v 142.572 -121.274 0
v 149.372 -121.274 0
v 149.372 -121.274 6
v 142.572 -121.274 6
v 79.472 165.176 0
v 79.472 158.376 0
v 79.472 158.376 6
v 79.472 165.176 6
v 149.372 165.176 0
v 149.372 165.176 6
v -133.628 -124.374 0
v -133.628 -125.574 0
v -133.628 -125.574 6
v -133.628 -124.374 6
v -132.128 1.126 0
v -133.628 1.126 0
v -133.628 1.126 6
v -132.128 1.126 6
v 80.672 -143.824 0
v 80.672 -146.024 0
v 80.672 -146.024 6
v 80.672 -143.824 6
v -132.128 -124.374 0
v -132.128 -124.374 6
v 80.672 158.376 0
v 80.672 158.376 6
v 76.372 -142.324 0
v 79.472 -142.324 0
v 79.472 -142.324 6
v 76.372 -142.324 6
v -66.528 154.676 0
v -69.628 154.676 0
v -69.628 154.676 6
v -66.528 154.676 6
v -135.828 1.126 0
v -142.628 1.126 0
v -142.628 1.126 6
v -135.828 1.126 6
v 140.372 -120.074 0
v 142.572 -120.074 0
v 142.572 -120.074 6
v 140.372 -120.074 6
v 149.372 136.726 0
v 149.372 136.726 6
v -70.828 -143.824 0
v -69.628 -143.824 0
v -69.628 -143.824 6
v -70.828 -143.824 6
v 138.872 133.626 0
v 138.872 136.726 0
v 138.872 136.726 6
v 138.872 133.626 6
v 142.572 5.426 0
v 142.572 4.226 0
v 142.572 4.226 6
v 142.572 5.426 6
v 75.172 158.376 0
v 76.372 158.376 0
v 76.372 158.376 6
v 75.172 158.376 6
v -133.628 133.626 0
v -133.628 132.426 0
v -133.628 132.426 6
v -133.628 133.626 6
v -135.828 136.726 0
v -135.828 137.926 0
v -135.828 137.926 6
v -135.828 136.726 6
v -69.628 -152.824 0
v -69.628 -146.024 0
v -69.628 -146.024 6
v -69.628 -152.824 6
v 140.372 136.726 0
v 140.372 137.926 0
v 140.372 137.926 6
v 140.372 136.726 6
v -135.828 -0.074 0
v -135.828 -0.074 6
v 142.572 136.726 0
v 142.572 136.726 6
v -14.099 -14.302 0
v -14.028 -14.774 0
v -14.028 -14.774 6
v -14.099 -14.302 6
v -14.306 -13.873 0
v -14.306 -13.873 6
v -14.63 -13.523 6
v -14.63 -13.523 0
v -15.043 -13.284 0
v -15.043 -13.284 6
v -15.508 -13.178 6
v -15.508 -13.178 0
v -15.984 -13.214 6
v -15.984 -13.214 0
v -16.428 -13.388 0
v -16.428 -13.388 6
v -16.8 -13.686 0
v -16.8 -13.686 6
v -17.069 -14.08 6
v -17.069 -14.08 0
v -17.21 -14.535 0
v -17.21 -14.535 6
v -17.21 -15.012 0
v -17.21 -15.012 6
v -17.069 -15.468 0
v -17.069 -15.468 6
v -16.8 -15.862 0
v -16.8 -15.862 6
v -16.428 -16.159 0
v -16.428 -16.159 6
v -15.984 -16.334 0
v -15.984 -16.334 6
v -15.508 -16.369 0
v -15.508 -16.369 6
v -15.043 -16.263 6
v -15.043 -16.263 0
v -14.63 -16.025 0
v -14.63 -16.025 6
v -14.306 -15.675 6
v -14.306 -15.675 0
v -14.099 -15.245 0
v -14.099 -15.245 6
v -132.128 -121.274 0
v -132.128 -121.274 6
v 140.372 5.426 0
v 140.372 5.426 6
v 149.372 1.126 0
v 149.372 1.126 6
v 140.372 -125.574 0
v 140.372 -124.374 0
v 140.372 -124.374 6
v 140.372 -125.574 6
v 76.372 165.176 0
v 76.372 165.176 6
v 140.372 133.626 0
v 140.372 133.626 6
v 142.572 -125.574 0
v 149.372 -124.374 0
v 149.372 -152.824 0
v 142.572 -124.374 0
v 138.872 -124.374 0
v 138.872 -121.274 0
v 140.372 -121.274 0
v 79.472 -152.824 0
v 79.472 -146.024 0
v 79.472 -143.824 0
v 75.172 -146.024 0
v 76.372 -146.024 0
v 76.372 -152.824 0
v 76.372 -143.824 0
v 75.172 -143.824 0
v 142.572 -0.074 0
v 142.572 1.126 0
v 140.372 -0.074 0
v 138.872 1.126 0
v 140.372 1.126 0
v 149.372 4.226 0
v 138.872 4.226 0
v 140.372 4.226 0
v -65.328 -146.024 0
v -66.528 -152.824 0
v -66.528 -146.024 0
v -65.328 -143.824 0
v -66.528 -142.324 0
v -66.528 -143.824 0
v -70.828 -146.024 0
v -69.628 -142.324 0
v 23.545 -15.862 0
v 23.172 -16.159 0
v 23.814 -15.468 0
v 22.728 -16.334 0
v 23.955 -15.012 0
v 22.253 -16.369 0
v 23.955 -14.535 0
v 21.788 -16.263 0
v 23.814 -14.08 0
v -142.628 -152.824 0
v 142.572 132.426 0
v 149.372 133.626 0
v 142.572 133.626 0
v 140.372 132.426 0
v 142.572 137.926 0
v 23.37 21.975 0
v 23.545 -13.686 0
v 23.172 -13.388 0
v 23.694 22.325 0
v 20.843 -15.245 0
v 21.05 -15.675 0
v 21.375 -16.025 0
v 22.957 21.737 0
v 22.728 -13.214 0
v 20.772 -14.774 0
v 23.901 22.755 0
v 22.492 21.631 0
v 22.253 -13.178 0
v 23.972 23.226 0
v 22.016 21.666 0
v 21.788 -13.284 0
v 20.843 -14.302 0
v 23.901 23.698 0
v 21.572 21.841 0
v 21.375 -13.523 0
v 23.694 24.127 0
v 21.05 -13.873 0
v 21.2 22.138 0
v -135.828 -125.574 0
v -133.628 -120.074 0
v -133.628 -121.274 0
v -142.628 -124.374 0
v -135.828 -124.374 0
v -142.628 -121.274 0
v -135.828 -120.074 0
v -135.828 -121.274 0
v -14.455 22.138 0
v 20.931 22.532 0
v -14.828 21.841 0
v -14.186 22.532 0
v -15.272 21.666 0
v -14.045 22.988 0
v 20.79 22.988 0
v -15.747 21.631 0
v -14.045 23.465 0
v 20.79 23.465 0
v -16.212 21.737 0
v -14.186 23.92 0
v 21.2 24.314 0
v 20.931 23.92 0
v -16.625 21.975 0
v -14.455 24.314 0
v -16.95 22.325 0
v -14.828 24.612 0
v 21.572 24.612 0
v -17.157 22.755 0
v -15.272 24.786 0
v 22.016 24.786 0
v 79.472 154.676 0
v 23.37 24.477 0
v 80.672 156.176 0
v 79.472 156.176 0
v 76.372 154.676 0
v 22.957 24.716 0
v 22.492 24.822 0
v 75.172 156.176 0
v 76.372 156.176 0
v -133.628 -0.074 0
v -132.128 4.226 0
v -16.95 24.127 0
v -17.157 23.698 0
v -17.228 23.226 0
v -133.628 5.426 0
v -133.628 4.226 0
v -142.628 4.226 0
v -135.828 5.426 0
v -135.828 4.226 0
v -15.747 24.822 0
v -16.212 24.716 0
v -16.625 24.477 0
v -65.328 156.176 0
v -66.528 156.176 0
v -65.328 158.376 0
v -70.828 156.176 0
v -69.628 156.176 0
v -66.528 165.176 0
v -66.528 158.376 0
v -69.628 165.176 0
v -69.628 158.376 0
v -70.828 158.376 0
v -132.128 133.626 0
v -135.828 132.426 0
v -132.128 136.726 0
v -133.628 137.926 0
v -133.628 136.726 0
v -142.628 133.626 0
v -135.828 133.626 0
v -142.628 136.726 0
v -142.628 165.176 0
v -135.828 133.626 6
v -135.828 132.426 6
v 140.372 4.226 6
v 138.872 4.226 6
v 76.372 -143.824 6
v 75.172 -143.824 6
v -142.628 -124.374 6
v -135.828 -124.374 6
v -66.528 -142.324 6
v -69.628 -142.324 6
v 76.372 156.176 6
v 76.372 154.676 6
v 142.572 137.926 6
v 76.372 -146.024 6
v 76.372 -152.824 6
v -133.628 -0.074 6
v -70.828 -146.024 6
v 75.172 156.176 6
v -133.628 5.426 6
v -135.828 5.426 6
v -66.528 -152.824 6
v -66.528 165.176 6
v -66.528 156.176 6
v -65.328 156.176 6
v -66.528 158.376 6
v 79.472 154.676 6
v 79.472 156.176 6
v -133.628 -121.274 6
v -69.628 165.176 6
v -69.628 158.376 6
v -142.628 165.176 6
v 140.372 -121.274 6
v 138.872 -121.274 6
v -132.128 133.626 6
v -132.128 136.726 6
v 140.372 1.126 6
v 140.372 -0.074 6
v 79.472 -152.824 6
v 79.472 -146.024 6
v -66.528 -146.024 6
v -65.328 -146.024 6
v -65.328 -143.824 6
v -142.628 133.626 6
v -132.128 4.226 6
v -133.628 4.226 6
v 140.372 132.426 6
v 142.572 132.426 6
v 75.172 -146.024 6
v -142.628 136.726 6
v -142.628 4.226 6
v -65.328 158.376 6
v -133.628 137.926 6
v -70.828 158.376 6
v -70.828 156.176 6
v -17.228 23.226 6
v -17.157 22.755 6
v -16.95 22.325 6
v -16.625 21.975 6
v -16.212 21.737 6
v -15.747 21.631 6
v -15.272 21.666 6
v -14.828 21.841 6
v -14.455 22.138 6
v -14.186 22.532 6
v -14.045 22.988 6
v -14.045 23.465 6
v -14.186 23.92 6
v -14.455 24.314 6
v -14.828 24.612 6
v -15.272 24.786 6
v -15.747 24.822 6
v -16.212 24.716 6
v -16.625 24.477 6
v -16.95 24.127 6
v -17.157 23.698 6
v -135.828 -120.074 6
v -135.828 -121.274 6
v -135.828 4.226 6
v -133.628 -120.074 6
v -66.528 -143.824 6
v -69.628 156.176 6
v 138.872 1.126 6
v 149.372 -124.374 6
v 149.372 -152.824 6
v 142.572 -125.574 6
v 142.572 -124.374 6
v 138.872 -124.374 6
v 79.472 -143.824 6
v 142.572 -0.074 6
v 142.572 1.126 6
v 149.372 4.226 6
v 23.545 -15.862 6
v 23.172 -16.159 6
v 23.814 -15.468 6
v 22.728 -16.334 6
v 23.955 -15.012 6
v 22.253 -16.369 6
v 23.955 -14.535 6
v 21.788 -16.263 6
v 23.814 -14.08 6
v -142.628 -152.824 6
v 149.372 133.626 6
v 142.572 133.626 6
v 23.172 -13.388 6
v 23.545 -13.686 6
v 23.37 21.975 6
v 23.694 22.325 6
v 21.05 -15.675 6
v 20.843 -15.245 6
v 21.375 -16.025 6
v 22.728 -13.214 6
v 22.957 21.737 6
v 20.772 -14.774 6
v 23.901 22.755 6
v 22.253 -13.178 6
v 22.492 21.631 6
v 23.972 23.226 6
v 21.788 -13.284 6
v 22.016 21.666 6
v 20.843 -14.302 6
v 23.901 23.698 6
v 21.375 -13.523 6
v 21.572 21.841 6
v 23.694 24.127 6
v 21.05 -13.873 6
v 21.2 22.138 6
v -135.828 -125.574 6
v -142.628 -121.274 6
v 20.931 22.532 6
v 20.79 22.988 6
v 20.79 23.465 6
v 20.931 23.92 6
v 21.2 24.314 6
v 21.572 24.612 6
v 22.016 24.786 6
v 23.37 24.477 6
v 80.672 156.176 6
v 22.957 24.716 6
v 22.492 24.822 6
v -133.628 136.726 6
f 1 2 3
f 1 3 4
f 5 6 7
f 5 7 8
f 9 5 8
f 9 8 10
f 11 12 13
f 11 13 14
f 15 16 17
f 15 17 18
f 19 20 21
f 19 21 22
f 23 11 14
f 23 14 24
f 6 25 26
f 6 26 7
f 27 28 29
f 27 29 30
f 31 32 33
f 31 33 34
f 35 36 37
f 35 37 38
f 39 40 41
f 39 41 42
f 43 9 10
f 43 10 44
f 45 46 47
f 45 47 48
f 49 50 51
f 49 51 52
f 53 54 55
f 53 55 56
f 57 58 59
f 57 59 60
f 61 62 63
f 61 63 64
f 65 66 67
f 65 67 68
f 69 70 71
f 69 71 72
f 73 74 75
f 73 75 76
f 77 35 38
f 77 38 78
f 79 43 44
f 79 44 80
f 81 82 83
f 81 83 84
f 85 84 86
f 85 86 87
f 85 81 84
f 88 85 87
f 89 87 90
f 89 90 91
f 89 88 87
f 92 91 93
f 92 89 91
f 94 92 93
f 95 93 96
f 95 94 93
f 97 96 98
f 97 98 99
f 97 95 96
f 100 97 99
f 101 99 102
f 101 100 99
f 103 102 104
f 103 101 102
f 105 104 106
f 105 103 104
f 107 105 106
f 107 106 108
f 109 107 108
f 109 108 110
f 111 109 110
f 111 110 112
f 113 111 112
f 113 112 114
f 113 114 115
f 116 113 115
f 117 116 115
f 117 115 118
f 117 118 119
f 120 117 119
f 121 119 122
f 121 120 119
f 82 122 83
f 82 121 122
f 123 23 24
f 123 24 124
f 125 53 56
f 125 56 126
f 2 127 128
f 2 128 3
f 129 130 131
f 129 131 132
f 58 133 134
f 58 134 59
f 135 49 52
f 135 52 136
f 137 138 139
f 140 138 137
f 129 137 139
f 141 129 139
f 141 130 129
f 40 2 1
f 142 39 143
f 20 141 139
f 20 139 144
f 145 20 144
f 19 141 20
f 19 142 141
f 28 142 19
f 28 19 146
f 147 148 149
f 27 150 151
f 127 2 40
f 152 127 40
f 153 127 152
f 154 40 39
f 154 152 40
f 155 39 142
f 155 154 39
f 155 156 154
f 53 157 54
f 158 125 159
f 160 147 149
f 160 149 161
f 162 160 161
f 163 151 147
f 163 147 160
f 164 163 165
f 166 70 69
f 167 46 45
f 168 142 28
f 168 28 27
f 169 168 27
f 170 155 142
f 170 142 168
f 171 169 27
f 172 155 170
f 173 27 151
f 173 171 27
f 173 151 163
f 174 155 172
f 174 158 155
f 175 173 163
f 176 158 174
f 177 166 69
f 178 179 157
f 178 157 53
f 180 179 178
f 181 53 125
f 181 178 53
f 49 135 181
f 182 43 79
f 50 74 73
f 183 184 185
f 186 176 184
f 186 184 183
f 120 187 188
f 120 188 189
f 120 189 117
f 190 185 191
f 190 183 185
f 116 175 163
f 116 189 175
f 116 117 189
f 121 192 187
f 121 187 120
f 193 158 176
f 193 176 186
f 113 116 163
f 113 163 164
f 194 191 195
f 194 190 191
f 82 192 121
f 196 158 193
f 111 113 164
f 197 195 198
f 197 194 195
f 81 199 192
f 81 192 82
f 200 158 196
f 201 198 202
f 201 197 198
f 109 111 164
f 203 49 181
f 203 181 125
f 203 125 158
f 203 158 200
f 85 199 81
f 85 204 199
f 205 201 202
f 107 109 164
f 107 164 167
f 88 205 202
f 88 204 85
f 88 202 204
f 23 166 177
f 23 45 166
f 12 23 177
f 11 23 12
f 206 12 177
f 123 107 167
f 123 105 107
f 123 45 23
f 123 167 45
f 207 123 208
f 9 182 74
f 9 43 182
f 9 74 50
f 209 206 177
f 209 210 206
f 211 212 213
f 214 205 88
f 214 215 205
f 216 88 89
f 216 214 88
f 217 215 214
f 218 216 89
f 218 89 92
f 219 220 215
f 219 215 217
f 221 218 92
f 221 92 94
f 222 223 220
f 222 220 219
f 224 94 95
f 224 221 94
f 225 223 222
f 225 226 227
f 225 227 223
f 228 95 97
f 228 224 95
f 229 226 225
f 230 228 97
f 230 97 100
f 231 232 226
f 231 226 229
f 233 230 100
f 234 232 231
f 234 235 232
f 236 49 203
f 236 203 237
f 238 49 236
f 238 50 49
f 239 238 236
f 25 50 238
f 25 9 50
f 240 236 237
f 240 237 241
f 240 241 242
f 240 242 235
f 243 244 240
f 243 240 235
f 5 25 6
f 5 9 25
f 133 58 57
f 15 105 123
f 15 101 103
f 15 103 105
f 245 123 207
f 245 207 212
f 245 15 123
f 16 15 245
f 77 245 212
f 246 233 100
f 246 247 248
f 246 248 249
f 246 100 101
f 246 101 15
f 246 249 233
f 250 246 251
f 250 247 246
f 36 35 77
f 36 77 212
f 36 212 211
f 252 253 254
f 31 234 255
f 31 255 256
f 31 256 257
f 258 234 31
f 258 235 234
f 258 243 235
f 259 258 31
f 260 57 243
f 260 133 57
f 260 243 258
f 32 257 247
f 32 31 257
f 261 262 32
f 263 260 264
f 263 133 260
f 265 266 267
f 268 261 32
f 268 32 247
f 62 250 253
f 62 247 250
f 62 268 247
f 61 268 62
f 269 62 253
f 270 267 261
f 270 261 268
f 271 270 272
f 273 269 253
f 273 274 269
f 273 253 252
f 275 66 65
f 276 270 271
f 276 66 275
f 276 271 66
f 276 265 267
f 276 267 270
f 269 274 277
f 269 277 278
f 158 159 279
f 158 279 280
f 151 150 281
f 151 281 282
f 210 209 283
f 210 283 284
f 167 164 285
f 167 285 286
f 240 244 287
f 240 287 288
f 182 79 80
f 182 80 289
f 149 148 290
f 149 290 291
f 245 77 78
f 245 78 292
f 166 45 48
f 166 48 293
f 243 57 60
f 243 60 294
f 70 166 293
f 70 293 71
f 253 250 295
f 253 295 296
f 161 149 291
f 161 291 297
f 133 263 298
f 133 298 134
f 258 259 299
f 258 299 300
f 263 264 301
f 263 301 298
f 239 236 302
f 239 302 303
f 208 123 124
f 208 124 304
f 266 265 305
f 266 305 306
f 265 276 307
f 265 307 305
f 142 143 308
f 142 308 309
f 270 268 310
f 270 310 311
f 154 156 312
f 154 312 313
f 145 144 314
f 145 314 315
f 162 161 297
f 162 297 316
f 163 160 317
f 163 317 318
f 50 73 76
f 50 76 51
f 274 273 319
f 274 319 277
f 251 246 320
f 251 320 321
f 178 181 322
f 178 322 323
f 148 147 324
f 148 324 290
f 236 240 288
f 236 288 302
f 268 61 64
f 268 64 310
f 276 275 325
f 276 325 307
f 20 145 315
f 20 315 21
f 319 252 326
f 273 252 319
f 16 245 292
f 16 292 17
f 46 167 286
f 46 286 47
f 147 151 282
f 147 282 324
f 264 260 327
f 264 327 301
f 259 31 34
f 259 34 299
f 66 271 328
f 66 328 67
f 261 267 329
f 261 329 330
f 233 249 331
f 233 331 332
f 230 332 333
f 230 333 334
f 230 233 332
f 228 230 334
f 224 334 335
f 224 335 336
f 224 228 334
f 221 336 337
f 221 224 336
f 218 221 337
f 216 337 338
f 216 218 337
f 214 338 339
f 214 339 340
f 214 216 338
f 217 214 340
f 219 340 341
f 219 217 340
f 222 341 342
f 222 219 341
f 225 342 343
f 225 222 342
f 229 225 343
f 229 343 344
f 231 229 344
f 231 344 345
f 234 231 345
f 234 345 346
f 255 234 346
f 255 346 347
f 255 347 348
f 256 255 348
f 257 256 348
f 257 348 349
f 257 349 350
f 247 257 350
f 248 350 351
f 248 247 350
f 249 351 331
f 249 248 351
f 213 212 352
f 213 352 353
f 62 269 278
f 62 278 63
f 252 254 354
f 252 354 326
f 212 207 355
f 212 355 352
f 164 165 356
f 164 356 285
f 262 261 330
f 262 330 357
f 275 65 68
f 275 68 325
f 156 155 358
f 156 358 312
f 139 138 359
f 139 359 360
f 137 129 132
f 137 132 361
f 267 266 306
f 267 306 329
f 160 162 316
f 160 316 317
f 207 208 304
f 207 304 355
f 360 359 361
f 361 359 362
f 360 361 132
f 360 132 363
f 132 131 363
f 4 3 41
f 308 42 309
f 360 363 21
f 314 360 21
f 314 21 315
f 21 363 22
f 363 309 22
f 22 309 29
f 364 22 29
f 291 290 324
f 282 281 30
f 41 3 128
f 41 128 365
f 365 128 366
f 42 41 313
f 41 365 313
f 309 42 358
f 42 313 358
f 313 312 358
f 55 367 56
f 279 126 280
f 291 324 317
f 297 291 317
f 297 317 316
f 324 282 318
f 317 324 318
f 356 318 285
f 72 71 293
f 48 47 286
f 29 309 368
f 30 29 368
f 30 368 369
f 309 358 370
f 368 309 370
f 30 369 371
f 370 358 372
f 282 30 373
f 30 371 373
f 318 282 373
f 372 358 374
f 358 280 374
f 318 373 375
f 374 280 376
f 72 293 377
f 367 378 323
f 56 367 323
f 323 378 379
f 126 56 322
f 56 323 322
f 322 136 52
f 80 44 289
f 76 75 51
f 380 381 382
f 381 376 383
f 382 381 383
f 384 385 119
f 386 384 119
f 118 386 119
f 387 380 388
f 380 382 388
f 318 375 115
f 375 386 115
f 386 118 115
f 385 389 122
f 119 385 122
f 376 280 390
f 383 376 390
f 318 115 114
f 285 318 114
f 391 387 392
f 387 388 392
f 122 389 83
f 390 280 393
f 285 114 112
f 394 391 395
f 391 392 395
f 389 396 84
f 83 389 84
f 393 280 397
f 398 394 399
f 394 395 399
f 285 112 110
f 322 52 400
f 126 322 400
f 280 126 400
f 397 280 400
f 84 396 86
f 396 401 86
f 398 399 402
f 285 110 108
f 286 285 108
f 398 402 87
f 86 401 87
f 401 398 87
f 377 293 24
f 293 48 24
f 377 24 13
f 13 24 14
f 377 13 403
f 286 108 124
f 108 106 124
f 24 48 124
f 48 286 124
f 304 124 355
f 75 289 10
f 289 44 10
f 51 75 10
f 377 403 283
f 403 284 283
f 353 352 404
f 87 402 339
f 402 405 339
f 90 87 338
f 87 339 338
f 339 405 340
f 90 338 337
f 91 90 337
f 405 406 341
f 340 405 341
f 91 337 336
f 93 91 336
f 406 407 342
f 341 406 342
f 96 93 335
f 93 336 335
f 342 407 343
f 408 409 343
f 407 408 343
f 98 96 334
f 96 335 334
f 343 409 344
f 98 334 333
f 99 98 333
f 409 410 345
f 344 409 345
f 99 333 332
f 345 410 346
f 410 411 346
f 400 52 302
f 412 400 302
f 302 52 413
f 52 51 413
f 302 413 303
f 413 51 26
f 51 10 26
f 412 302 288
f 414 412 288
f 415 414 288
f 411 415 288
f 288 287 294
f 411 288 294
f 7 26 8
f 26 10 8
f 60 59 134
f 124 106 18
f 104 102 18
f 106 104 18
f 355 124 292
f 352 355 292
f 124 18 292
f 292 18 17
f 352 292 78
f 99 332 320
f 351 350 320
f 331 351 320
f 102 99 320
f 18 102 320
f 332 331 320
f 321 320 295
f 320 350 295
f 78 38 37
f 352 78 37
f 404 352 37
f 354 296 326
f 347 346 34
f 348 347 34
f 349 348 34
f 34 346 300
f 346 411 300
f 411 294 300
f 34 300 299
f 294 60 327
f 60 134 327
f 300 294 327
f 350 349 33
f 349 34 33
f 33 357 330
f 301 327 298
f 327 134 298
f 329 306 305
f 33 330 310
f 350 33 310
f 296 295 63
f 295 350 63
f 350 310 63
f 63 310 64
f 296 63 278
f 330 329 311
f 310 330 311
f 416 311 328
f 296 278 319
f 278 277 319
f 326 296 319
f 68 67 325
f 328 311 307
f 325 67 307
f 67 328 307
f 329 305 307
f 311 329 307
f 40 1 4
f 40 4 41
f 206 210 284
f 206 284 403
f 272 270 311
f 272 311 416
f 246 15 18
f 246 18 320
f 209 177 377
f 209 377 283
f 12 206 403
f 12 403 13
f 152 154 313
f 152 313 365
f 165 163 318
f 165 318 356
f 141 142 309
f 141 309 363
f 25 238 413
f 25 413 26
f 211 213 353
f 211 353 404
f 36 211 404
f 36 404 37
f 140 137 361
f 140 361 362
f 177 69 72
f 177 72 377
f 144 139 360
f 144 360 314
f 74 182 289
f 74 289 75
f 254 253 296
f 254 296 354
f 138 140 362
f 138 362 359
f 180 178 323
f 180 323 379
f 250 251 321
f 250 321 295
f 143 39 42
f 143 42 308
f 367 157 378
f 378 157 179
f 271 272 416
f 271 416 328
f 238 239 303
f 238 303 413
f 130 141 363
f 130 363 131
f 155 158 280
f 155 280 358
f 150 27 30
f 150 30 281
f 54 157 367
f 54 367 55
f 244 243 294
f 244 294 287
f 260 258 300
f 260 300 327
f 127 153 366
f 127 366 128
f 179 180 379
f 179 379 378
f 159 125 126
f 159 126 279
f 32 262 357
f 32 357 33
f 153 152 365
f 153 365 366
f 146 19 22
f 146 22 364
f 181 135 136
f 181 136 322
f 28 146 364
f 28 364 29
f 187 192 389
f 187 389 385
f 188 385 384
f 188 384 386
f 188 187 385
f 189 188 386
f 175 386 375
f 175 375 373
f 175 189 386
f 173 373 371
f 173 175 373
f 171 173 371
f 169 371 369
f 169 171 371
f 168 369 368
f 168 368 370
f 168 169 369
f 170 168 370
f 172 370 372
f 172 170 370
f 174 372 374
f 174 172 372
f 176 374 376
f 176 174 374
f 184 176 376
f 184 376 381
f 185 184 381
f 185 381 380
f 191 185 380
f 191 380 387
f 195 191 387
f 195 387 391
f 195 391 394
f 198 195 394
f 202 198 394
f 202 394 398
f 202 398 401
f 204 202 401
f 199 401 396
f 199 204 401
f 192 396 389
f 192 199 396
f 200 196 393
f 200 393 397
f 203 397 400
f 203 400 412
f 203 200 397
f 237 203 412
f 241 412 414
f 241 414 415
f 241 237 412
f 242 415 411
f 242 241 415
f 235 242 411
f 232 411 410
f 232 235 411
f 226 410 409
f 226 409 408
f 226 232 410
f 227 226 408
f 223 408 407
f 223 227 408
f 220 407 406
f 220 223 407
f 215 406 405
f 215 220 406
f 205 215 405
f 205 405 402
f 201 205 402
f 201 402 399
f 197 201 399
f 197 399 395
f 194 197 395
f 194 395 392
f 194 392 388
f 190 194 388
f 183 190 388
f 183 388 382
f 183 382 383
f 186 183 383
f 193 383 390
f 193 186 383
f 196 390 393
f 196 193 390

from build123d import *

# Parameters (mm, degrees)
SKETCH_1_R      = 1.6
EXTRUDE_1_DEPTH = 6


with BuildPart() as part:
    # Эскиз1 → Бобышка-Вытянуть1 (new body)
    with BuildSketch(Plane.XY):
        Polygon((-142.627592608, 165.17616196), (-69.627592608, 165.17616196), (-69.627592608, 158.37616196), (-70.827592608, 158.37616196), (-70.827592608, 156.17616196), (-69.627592608, 156.17616196), (-69.627592608, 154.67616196), (-66.527592608, 154.67616196), (-66.527592608, 156.17616196), (-65.327592608, 156.17616196), (-65.327592608, 158.37616196), (-66.527592608, 158.37616196), (-66.527592608, 165.17616196), (76.372407392, 165.17616196), (76.372407392, 158.37616196), (75.172407392, 158.37616196), (75.172407392, 156.17616196), (76.372407392, 156.17616196), (76.372407392, 154.67616196), (79.472407392, 154.67616196), (79.472407392, 156.17616196), (80.672407392, 156.17616196), (80.672407392, 158.37616196), (79.472407392, 158.37616196), (79.472407392, 165.17616196), (149.372407392, 165.17616196), (149.372407392, 136.72616196), (142.572407392, 136.72616196), (142.572407392, 137.92616196), (140.372407392, 137.92616196), (140.372407392, 136.72616196), (138.872407392, 136.72616196), (138.872407392, 133.62616196), (140.372407392, 133.62616196), (140.372407392, 132.42616196), (142.572407392, 132.42616196), (142.572407392, 133.62616196), (149.372407392, 133.62616196), (149.372407392, 132.07616196), (149.372407392, 4.22616196), (142.572407392, 4.22616196), (142.572407392, 5.42616196), (140.372407392, 5.42616196), (140.372407392, 4.22616196), (138.872407392, 4.22616196), (138.872407392, 1.12616196), (140.372407392, 1.12616196), (140.372407392, -0.07383804), (142.572407392, -0.07383804), (142.572407392, 1.12616196), (149.372407392, 1.12616196), (149.372407392, -121.27383804), (142.572407392, -121.27383804), (142.572407392, -120.07383804), (140.372407392, -120.07383804), (140.372407392, -121.27383804), (138.872407392, -121.27383804), (138.872407392, -124.37383804), (140.372407392, -124.37383804), (140.372407392, -125.57383804), (142.572407392, -125.57383804), (142.572407392, -124.37383804), (149.372407392, -124.37383804), (149.372407392, -152.82383804), (79.472407392, -152.82383804), (79.472407392, -146.02383804), (80.672407392, -146.02383804), (80.672407392, -143.82383804), (79.472407392, -143.82383804), (79.472407392, -142.32383804), (76.372407392, -142.32383804), (76.372407392, -143.82383804), (75.172407392, -143.82383804), (75.172407392, -146.02383804), (76.372407392, -146.02383804), (76.372407392, -152.82383804), (-66.527592608, -152.82383804), (-66.527592608, -146.02383804), (-65.327592608, -146.02383804), (-65.327592608, -143.82383804), (-66.527592608, -143.82383804), (-66.527592608, -142.32383804), (-69.627592608, -142.32383804), (-69.627592608, -143.82383804), (-70.827592608, -143.82383804), (-70.827592608, -146.02383804), (-69.627592608, -146.02383804), (-69.627592608, -152.82383804), (-142.627592608, -152.82383804), (-142.627592608, -124.37383804), (-135.827592608, -124.37383804), (-135.827592608, -125.57383804), (-133.627592608, -125.57383804), (-133.627592608, -124.37383804), (-132.127592608, -124.37383804), (-132.127592608, -121.27383804), (-133.627592608, -121.27383804), (-133.627592608, -120.07383804), (-135.827592608, -120.07383804), (-135.827592608, -121.27383804), (-142.627592608, -121.27383804), (-142.627592608, 1.12616196), (-135.827592608, 1.12616196), (-135.827592608, -0.07383804), (-133.627592608, -0.07383804), (-133.627592608, 1.12616196), (-132.127592608, 1.12616196), (-132.127592608, 4.22616196), (-133.627592608, 4.22616196), (-133.627592608, 5.42616196), (-135.827592608, 5.42616196), (-135.827592608, 4.22616196), (-142.627592608, 4.22616196), (-142.627592608, 133.62616196), (-135.827592608, 133.62616196), (-135.827592608, 132.42616196), (-133.627592608, 132.42616196), (-133.627592608, 133.62616196), (-132.127592608, 133.62616196), (-132.127592608, 136.72616196), (-133.627592608, 136.72616196), (-133.627592608, 137.92616196), (-135.827592608, 137.92616196), (-135.827592608, 136.72616196), (-142.627592608, 136.72616196), align=None)
        with Locations((22.372407392, 23.22616196)):
            Circle(SKETCH_1_R, mode=Mode.SUBTRACT)
        with Locations(Location((-15.627592608, 23.22616196, 0), (0, 0, 180))):
            Circle(SKETCH_1_R, mode=Mode.SUBTRACT)
        with Locations(Location((22.372407392, -14.77383804, 0), (0, 0, 180))):
            Circle(SKETCH_1_R, mode=Mode.SUBTRACT)
        with Locations((-15.627592608, -14.77383804)):
            Circle(SKETCH_1_R, mode=Mode.SUBTRACT)
    extrude(amount=EXTRUDE_1_DEPTH)


solid = part.part
